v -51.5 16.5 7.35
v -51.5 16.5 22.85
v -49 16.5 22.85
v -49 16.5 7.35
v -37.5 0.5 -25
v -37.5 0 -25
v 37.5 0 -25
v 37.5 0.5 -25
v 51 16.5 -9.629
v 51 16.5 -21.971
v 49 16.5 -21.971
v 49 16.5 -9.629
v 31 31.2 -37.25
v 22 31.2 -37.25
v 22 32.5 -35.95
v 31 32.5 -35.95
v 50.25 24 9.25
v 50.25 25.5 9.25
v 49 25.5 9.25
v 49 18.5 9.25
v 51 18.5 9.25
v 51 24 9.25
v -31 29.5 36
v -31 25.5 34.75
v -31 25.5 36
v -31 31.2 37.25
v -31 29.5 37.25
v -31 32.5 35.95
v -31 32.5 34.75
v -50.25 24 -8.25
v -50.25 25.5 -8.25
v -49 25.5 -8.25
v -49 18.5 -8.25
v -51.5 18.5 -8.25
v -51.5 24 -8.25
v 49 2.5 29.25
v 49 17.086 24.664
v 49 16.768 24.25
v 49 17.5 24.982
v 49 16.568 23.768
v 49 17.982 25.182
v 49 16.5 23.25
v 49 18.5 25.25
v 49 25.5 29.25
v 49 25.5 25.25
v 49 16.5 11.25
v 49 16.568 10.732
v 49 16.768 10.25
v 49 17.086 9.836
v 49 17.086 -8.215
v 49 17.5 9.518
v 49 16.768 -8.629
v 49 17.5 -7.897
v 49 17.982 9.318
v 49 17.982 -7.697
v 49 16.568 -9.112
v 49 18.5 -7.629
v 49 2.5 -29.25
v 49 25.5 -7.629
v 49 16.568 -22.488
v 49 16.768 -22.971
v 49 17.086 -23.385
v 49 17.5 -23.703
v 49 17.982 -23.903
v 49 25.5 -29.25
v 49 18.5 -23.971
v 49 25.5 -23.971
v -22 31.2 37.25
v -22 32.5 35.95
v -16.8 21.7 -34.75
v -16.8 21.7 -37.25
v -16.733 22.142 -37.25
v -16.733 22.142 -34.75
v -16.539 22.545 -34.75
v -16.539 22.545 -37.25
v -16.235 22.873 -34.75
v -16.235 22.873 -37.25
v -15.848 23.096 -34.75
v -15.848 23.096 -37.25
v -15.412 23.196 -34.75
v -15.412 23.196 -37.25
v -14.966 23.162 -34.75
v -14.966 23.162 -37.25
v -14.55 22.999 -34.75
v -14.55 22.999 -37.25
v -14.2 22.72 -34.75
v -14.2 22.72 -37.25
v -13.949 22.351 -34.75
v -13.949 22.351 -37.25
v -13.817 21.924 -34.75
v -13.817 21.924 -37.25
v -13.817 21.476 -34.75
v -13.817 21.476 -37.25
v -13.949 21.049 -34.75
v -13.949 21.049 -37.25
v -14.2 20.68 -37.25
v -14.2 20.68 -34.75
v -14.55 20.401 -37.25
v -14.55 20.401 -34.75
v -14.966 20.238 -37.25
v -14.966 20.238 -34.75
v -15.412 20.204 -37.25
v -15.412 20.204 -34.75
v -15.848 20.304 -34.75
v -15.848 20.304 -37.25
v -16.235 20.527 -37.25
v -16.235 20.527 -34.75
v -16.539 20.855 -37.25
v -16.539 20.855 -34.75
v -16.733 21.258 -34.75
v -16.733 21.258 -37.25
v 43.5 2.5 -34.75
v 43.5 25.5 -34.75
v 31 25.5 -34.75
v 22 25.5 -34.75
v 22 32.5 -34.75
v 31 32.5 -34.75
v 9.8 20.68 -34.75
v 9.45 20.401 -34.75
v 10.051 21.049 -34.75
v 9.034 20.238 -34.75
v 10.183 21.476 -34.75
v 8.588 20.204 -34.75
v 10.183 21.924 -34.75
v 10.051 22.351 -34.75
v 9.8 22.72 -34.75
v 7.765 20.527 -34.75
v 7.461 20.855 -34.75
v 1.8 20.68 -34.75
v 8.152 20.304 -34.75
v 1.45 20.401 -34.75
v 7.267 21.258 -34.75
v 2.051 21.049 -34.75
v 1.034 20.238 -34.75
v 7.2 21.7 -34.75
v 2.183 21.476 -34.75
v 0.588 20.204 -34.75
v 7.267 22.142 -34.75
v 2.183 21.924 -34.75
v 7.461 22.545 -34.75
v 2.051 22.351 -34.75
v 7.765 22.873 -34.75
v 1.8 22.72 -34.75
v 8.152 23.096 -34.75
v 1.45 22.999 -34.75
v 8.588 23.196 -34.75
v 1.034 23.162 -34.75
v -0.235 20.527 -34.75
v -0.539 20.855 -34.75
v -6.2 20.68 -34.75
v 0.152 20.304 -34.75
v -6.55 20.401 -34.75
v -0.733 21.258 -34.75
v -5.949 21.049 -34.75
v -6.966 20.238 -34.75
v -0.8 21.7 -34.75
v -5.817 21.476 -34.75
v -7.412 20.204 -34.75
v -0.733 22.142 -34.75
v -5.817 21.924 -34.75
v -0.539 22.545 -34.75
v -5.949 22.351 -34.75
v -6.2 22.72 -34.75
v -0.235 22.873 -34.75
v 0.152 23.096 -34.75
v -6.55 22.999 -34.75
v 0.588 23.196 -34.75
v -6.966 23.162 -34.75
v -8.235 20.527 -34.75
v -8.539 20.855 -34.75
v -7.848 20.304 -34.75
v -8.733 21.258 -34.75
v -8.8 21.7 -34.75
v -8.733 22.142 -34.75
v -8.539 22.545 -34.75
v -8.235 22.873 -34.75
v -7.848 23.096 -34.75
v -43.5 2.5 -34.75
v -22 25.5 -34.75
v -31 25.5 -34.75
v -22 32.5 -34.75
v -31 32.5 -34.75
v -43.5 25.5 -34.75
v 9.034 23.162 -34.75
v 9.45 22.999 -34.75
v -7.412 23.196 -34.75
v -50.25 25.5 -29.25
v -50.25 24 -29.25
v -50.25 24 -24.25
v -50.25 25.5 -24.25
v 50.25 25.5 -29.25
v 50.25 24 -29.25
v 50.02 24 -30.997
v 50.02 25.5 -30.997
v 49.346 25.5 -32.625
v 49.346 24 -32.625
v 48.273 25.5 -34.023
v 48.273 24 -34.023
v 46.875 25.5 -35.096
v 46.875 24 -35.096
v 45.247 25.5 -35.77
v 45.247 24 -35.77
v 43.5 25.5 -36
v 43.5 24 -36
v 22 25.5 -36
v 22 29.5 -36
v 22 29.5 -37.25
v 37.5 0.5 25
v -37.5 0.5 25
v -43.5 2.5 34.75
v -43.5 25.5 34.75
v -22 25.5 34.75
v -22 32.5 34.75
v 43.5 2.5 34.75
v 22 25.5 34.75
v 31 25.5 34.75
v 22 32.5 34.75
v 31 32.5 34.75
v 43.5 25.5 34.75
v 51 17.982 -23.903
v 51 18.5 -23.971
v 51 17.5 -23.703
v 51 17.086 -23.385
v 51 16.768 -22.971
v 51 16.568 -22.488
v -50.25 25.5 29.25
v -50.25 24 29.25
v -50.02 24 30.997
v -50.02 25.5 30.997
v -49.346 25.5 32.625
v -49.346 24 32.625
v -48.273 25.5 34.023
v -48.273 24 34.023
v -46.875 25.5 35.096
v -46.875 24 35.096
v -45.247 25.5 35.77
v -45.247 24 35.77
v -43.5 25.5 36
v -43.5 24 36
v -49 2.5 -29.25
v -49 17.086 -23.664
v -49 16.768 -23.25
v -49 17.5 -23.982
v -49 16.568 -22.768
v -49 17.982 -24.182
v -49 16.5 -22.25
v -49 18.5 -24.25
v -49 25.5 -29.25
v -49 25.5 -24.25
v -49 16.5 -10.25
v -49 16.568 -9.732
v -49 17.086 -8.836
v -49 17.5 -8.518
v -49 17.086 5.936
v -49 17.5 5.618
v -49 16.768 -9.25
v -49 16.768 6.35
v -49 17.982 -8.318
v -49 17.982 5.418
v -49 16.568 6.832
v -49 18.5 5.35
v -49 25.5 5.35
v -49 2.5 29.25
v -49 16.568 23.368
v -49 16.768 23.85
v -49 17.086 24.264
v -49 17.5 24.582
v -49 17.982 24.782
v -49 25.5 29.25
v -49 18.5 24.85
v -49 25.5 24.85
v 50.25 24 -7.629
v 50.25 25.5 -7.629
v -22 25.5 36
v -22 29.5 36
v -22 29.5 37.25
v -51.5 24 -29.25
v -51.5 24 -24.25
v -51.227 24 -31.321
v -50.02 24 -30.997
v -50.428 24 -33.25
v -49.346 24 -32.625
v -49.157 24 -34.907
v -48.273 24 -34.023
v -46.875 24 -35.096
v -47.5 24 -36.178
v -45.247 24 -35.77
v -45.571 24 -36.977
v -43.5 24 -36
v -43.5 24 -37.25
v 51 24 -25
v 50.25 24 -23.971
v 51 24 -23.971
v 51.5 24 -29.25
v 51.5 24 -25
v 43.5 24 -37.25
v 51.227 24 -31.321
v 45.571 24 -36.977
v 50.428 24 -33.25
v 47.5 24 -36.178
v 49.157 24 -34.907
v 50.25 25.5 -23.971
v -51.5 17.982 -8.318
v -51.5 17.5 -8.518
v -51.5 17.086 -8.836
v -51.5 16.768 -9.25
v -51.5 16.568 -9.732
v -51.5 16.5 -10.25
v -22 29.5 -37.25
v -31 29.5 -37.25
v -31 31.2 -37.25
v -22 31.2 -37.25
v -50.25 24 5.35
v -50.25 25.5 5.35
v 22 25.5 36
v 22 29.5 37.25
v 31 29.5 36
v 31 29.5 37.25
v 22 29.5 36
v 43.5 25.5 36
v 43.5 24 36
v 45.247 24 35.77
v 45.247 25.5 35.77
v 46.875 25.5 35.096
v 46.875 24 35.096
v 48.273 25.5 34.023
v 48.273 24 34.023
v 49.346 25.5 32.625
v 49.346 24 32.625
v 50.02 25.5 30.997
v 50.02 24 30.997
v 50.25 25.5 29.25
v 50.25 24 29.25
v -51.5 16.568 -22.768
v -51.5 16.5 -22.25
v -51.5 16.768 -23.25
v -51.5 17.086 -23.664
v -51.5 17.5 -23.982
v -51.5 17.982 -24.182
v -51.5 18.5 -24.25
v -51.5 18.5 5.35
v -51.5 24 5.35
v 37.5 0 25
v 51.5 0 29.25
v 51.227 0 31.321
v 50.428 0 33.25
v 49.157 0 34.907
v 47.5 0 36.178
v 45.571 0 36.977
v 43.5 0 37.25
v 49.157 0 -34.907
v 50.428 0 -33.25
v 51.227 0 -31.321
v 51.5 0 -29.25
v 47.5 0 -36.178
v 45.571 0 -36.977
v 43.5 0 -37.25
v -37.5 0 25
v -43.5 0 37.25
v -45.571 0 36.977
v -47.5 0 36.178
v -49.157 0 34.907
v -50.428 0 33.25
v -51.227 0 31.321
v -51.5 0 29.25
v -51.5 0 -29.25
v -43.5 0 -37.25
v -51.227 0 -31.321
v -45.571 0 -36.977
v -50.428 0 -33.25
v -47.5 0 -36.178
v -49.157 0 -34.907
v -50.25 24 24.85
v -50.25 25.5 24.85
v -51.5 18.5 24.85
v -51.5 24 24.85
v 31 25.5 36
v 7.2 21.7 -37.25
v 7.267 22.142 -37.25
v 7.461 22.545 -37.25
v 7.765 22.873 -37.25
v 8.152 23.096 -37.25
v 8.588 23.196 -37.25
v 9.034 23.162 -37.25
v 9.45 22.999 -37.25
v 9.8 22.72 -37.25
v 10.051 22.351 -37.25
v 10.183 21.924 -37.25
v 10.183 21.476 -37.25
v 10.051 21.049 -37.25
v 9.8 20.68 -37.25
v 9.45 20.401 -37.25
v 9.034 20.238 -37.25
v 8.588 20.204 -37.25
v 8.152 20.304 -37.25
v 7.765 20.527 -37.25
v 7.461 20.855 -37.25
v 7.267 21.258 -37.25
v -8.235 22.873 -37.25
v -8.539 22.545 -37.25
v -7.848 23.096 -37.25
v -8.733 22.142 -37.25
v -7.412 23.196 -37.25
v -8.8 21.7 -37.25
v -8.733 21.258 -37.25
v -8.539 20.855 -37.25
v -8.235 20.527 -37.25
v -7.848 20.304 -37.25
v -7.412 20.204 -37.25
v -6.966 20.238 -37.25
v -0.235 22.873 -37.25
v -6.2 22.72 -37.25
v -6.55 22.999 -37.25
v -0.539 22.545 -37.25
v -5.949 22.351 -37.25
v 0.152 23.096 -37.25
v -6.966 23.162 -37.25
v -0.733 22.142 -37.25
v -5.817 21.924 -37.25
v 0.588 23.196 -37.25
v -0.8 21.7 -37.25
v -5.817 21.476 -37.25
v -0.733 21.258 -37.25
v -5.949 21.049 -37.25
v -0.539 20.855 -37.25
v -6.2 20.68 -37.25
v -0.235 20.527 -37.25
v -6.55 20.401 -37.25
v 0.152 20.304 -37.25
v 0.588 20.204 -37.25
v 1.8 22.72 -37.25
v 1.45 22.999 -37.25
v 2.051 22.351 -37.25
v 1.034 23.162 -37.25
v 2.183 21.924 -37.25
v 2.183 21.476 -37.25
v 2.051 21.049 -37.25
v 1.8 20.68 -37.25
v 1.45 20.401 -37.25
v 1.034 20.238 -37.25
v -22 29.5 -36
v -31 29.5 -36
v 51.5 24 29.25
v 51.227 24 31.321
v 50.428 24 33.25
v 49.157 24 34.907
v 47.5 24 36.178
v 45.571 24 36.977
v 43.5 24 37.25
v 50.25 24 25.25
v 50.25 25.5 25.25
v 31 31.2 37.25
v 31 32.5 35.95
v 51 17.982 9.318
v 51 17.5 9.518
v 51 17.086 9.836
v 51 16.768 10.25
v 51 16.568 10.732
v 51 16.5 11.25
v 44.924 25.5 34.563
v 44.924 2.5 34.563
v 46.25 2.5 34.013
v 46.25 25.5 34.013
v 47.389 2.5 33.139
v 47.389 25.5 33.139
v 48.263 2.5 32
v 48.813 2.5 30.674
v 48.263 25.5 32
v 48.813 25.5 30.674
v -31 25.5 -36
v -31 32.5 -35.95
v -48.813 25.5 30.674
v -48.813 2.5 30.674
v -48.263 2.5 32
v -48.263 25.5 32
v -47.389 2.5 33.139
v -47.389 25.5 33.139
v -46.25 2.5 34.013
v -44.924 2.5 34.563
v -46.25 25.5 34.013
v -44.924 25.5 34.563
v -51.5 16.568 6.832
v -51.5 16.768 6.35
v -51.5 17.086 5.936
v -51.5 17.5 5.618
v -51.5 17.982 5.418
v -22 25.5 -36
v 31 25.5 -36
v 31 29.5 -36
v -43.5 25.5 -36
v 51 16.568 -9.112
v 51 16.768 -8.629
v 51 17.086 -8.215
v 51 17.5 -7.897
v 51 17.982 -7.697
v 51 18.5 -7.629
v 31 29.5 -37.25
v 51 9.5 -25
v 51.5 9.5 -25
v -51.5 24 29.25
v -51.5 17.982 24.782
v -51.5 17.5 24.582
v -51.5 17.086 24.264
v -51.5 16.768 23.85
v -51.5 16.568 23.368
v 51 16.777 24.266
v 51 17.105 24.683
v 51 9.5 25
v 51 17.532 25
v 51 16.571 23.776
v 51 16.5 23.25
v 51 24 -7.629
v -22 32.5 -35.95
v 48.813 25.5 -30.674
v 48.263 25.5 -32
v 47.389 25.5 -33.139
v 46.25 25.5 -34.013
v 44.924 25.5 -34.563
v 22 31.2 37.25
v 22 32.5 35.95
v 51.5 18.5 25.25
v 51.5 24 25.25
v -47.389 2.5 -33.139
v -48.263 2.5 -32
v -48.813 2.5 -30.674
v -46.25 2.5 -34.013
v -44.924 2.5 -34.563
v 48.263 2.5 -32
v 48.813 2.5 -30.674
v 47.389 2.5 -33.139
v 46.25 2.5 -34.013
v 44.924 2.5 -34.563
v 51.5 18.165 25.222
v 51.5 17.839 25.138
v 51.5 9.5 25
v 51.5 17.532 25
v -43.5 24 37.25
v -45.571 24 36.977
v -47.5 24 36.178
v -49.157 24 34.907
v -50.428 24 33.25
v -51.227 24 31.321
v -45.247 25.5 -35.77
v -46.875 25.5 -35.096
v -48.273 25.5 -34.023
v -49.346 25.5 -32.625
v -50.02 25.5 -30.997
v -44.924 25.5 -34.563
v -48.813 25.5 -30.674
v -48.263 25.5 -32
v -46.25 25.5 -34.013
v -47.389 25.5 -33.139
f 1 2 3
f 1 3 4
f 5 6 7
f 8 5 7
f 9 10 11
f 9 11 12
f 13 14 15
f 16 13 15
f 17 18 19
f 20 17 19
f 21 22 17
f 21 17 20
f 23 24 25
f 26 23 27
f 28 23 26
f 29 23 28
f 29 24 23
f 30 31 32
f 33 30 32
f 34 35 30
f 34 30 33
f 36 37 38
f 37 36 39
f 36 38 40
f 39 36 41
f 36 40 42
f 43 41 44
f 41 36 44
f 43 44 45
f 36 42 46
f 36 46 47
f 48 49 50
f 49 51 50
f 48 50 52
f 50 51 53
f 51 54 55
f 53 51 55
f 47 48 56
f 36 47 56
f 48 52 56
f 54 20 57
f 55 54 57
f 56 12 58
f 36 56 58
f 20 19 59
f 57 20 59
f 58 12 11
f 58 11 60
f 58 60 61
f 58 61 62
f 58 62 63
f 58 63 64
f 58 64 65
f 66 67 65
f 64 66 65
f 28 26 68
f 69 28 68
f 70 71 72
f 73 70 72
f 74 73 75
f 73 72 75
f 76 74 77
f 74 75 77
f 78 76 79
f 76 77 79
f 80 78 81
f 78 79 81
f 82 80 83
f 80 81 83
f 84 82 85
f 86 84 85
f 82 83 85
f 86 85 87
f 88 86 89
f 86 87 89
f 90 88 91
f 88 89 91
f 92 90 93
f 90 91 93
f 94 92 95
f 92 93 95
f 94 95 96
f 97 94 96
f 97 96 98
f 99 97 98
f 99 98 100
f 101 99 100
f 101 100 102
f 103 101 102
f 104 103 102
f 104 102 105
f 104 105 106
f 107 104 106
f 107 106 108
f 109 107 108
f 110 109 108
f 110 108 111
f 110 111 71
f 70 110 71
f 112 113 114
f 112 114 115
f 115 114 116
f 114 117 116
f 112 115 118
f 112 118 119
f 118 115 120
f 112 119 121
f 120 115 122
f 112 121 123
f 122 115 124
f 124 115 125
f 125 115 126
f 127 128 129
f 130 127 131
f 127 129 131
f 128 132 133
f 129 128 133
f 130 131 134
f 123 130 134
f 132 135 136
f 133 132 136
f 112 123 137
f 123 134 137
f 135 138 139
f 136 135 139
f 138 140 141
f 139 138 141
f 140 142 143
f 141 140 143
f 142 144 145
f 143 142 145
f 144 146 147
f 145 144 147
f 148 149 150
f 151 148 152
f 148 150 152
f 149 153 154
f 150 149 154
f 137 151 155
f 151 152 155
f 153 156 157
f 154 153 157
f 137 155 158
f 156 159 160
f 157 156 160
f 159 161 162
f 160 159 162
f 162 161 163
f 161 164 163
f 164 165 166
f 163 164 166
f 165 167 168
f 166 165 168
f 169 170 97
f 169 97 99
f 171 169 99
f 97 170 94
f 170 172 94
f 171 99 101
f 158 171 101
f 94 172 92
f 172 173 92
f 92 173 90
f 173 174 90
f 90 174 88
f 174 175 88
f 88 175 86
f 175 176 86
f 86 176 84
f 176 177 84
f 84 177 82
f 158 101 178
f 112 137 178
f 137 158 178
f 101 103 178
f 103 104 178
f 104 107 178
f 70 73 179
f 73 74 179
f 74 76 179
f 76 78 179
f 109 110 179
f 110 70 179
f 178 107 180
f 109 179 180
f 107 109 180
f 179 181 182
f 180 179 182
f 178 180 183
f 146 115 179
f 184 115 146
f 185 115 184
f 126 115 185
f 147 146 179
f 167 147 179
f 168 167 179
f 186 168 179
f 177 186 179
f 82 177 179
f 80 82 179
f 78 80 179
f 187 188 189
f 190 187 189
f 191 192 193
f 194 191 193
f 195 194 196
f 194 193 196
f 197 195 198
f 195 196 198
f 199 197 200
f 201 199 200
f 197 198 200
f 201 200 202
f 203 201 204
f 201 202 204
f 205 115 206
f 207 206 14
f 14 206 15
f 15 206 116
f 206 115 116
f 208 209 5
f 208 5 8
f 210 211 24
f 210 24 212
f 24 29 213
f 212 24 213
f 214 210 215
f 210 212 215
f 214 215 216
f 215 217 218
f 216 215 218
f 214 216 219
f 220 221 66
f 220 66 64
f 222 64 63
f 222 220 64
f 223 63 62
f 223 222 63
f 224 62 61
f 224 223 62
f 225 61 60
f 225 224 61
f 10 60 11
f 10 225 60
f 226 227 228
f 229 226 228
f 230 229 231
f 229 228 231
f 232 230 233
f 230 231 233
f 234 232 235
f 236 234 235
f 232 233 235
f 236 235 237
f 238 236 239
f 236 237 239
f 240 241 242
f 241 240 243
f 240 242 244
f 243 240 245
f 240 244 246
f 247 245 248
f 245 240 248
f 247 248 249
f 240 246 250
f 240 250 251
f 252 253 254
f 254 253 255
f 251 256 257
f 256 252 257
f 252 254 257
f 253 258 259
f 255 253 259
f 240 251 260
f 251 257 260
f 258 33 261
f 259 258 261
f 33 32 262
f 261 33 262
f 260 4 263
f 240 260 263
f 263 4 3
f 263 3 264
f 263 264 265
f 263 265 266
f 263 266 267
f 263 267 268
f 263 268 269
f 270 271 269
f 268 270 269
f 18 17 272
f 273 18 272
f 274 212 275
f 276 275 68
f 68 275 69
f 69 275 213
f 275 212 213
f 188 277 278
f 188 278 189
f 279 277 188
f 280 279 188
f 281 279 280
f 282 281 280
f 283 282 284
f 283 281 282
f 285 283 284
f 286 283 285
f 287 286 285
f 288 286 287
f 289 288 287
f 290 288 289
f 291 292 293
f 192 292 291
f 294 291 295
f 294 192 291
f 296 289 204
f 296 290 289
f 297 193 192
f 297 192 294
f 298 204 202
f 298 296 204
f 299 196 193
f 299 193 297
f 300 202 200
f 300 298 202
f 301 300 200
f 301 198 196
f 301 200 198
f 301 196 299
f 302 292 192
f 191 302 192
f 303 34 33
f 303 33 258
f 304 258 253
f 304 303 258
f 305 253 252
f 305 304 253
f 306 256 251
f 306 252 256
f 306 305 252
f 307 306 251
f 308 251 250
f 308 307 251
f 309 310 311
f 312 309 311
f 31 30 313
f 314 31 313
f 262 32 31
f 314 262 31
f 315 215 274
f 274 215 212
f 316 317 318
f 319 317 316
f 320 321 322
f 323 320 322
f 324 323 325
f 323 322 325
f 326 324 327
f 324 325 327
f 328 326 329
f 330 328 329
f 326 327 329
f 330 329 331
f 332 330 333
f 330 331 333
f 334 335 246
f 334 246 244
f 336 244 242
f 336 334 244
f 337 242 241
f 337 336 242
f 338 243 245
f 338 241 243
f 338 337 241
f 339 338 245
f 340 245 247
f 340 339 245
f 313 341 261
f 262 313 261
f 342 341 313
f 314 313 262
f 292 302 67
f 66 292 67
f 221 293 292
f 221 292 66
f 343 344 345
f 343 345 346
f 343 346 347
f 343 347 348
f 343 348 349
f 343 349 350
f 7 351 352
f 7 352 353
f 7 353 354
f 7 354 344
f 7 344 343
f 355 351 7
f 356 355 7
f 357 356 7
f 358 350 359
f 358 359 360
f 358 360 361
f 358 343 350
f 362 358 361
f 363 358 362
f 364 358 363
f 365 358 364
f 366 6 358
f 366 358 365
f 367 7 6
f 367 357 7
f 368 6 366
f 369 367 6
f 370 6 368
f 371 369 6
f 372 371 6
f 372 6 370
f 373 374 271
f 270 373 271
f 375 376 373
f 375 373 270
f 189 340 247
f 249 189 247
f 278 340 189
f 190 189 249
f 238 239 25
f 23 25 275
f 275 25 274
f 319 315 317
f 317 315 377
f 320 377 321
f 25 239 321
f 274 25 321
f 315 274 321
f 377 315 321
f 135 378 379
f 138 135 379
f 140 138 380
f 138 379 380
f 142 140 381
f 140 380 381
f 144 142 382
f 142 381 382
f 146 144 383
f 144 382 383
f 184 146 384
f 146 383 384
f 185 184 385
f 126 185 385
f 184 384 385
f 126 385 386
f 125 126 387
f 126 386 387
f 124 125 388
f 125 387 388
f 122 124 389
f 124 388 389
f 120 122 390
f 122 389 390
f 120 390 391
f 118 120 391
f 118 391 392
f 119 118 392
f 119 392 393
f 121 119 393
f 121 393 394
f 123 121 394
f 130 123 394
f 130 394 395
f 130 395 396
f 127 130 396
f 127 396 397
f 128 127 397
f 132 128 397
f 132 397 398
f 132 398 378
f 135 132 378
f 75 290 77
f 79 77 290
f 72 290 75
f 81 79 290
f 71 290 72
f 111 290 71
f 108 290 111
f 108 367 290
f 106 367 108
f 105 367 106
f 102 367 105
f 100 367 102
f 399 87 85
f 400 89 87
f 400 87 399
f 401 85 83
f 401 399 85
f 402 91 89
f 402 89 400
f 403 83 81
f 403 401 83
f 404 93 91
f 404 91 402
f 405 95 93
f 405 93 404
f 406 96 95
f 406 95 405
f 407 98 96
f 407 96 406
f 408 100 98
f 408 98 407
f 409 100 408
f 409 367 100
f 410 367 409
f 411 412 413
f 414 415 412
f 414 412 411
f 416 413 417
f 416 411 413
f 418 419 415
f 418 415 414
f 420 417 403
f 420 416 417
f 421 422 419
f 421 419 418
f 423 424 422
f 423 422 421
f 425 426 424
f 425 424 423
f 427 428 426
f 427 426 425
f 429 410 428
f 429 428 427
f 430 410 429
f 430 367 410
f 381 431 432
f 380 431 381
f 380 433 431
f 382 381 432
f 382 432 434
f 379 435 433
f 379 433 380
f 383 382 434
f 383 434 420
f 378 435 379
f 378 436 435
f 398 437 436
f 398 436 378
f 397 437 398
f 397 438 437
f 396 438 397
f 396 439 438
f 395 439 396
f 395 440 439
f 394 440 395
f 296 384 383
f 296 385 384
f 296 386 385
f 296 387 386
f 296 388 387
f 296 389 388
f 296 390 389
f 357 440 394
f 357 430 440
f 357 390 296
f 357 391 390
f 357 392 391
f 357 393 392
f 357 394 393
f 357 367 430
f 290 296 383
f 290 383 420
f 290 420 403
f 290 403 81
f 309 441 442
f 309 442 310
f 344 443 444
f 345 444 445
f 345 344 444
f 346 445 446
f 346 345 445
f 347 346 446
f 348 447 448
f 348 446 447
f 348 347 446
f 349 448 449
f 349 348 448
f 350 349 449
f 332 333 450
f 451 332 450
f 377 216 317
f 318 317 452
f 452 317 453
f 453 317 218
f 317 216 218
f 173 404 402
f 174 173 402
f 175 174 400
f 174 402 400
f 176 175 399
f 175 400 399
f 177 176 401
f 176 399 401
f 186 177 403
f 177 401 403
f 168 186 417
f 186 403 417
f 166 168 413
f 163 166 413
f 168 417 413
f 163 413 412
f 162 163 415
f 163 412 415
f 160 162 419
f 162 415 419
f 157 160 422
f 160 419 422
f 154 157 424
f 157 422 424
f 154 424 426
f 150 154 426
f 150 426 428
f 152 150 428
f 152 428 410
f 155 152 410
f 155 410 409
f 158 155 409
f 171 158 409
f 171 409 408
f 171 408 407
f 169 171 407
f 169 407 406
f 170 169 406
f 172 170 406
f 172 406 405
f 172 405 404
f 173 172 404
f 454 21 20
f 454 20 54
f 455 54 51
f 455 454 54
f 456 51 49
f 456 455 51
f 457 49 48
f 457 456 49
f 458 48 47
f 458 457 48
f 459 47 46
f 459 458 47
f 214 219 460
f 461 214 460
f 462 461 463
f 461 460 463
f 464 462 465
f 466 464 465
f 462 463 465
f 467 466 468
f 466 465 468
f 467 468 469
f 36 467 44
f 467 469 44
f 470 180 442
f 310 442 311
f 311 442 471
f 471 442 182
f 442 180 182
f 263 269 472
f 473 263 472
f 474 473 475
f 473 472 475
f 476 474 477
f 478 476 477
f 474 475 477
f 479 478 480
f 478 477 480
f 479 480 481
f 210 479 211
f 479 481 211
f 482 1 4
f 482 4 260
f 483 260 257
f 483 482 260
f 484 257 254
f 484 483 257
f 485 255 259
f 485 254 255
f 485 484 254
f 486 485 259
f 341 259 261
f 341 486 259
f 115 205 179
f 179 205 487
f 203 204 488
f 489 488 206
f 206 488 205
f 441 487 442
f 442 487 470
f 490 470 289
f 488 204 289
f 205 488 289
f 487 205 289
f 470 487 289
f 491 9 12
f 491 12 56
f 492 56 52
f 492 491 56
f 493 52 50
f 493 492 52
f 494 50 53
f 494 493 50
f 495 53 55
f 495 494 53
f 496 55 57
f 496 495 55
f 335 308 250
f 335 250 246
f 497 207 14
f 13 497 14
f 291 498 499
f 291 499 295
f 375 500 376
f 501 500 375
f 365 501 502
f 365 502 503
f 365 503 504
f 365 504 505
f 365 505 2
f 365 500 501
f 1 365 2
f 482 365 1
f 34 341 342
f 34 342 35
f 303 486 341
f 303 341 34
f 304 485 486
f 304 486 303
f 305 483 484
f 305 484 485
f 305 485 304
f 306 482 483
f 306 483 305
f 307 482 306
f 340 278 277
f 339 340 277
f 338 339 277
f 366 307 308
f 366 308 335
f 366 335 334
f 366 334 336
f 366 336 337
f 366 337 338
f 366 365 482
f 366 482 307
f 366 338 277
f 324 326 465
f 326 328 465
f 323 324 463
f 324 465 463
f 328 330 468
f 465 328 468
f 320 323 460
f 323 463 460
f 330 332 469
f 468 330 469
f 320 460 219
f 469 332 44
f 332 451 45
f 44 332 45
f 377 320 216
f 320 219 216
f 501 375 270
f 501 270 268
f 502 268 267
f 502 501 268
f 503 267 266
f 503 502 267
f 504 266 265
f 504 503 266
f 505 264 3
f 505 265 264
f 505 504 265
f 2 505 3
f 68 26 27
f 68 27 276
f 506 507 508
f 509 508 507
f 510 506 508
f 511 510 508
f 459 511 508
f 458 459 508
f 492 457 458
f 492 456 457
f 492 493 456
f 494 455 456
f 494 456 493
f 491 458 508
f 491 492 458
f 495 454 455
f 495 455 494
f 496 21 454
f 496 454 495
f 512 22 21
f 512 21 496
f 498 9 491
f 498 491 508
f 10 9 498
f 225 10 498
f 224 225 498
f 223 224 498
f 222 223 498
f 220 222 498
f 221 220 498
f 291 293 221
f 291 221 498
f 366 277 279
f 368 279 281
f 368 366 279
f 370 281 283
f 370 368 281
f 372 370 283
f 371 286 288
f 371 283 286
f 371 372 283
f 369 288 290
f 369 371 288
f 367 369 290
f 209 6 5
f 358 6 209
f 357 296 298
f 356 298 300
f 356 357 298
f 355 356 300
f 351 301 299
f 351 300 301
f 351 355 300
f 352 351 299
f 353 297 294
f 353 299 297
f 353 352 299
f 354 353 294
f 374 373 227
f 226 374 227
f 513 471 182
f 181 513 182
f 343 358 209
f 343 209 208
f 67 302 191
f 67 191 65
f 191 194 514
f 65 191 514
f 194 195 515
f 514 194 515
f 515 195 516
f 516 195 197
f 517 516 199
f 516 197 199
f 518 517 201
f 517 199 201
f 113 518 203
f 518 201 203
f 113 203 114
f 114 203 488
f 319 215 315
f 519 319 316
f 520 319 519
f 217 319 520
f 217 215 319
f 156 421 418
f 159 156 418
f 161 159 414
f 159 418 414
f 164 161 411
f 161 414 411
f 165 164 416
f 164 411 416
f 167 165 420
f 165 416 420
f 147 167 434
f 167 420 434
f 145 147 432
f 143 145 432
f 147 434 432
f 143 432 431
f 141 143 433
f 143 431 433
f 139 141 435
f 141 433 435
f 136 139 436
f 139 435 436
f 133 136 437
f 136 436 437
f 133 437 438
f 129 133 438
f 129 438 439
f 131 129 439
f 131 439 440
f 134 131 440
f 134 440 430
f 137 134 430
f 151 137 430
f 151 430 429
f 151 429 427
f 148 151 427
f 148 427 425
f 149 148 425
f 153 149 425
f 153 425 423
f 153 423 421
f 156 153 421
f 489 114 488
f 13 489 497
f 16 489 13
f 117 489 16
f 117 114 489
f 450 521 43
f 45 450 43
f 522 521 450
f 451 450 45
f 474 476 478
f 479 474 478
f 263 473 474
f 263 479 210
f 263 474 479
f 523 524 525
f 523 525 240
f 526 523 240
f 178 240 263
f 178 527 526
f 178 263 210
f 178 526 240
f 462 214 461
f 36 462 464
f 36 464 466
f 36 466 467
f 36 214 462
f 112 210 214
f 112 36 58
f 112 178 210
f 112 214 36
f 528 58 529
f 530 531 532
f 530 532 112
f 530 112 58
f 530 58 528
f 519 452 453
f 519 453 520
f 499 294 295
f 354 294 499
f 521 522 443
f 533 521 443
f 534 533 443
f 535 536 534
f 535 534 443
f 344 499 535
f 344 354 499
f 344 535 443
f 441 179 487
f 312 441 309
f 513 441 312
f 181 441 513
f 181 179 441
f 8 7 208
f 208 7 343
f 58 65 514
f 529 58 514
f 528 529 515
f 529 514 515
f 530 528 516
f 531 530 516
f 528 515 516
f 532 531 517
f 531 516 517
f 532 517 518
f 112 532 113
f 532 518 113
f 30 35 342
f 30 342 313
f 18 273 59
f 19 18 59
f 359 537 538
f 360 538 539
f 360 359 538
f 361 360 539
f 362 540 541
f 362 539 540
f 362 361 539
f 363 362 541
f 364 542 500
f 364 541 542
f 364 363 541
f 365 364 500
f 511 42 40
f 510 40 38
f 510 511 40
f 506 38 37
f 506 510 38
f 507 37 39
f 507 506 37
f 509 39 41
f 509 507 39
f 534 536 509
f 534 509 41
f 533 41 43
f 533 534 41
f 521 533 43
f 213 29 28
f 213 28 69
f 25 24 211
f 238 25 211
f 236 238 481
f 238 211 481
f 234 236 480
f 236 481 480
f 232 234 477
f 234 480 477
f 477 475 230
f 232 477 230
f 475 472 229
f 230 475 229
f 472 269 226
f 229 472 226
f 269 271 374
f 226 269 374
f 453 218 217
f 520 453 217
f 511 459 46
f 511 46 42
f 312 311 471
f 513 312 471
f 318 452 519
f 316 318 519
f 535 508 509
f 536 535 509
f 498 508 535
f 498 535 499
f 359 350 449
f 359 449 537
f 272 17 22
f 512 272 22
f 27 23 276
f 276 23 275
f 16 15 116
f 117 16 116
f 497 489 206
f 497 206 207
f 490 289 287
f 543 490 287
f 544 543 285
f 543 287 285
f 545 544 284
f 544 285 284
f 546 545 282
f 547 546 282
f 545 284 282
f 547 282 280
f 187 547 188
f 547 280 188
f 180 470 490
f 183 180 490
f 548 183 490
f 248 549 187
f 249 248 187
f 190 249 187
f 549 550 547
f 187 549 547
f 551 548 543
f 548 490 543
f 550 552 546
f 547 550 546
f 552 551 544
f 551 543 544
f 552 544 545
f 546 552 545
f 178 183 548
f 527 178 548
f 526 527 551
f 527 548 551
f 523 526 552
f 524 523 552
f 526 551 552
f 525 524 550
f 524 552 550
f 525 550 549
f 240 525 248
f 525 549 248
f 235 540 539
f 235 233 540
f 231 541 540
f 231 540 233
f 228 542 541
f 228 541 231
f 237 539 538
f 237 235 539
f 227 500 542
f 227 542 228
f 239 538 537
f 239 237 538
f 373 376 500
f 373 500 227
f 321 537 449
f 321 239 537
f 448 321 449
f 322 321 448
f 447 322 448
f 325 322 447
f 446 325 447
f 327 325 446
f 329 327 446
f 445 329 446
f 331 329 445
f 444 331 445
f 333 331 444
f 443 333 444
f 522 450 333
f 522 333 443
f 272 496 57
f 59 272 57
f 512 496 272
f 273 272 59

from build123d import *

# Parameters (mm, degrees)
EXTRUDE_1_DEPTH            = 25.5
CUT_EXTRUDE_1_DEPTH        = 23
CUT_EXTRUDE_START          = -1.5
CUT_EXTRUDE_2_DEPTH        = 1.5
SKETCH_3_W                 = 9
SKETCH_3_H                 = 1.25
EXTRUDE_2_DEPTH            = 7
SKETCH_4_W                 = 9
SKETCH_4_H                 = 3
EXTRUDE_3_DEPTH            = 1.25
CHAMFER_1_SIZE             = 1.3
CHAMFER_1_OF_MIRROR_1_SIZE = 1.3
MIRROR_START               = -31
MIRROR_4_DEPTH             = 9
MIRROR_START_2             = 22
MIRROR_4_2_DEPTH           = 9
SKETCH_5_W                 = 75
SKETCH_5_H                 = 50
CUT_EXTRUDE_3_DEPTH        = 0.5
CUT_EXTRUDE_4_DEPTH        = 115.248905903
CUT_EXTRUDE_4_DEPTH_BACK   = 0.5
SKETCH_6_W                 = 50
SKETCH_6_H                 = 14.5
CUT_EXTRUDE_5_REACH        = 98.222
SKETCH_7_R                 = 1.5
CUT_EXTRUDE_6_REACH        = 116.249
CUT_EXTRUDE_7_REACH        = 116.249


# Read off the part's stored shape, not the designer's step: Зеркальное отражение4
with BuildPart() as part:
    # Эскиз1 → Бобышка-Вытянуть1 (new body)
    with BuildSketch(Plane(origin=(0, 0, 0), x_dir=(1, 0, 0), z_dir=(0, 1, 0))):
        with BuildLine():
            Line((-43.5, 37.25), (43.5, 37.25))
            ThreePointArc((43.5, 37.25), (49.156854249, 34.906854249), (51.5, 29.25))
            Line((51.5, 29.25), (51.5, -29.25))
            ThreePointArc((51.5, -29.25), (49.156854249, -34.906854249), (43.5, -37.25))
            Line((43.5, -37.25), (-43.5, -37.25))
            ThreePointArc((-43.5, -37.25), (-49.156854249, -34.906854249), (-51.5, -29.25))
            Line((-51.5, -29.25), (-51.5, 29.25))
            ThreePointArc((-51.5, 29.25), (-49.156854249, 34.906854249), (-43.5, 37.25))
        make_face()
    extrude(amount=EXTRUDE_1_DEPTH)

    # Эскиз2 → Вырез-Вытянуть1 (cut)
    with BuildSketch(Plane(origin=(0, 25.5, 0), x_dir=(1, 0, 0), z_dir=(0, 1, 0))):
        with BuildLine():
            Line((-49, 29.25), (-49, -29.25))
            ThreePointArc((-49, -29.25), (-47.389087297, -33.139087297), (-43.5, -34.75))
            Line((-43.5, -34.75), (43.5, -34.75))
            ThreePointArc((43.5, -34.75), (47.389087297, -33.139087297), (49, -29.25))
            Line((49, -29.25), (49, 29.25))
            ThreePointArc((49, 29.25), (47.389087297, 33.139087297), (43.5, 34.75))
            Line((43.5, 34.75), (-43.5, 34.75))
            ThreePointArc((-43.5, 34.75), (-47.389087297, 33.139087297), (-49, 29.25))
        make_face()
    extrude(amount=-CUT_EXTRUDE_1_DEPTH, mode=Mode.SUBTRACT)

    # Эскиз2<3> → Вырез-Вытянуть2 (cut)
    with BuildSketch(Plane(origin=(0, 25.5, 0), x_dir=(1, 0, 0), z_dir=(0, 1, 0)).offset(CUT_EXTRUDE_START)):
        with BuildLine():
            Line((51.5, -29.25), (51.5, 29.25))
            ThreePointArc((51.5, 29.25), (49.156854249, 34.906854249), (43.5, 37.25))
            Line((43.5, 37.25), (-43.5, 37.25))
            ThreePointArc((-43.5, 37.25), (-49.156854249, 34.906854249), (-51.5, 29.25))
            Line((-51.5, 29.25), (-51.5, -29.25))
            ThreePointArc((-51.5, -29.25), (-49.156854249, -34.906854249), (-43.5, -37.25))
            Line((-43.5, -37.25), (43.5, -37.25))
            ThreePointArc((43.5, -37.25), (49.156854249, -34.906854249), (51.5, -29.25))
        make_face()
        with BuildLine():
            ThreePointArc((43.5, -36), (48.272970773, -34.022970773), (50.25, -29.25))
            Line((50.25, -29.25), (50.25, 29.25))
            ThreePointArc((50.25, 29.25), (48.272970773, 34.022970773), (43.5, 36))
            Line((43.5, 36), (-43.5, 36))
            ThreePointArc((-43.5, 36), (-48.272970773, 34.022970773), (-50.25, 29.25))
            Line((-50.25, 29.25), (-50.25, -29.25))
            ThreePointArc((-50.25, -29.25), (-48.272970773, -34.022970773), (-43.5, -36))
            Line((-43.5, -36), (43.5, -36))
        make_face(mode=Mode.SUBTRACT)
    extrude(amount=CUT_EXTRUDE_2_DEPTH, mode=Mode.SUBTRACT)

    # Эскиз3 → Бобышка-Вытянуть2 (add)
    with BuildSketch(Plane(origin=(0, 25.5, 0), x_dir=(1, 0, 0), z_dir=(0, 1, 0))):
        with Locations((-26.5, -35.375)):
            Rectangle(SKETCH_3_W, SKETCH_3_H)
    extrude_2 = extrude(amount=EXTRUDE_2_DEPTH)

    # Эскиз4 → Бобышка-Вытянуть3 (add, through all)
    with BuildSketch(Plane.XY.offset(36)):
        with Locations((-26.5, 31)):
            Rectangle(SKETCH_4_W, SKETCH_4_H)
    extrude_3 = extrude(amount=EXTRUDE_3_DEPTH)

    # Фаска1
    chamfer_1_edges = [part.edges().sort_by_distance(p)[0] for p in [
        (-26.5, 32.5, 37.25),
    ]]
    chamfer(chamfer_1_edges, length=CHAMFER_1_SIZE)

    # Зеркальное отражение1: Бобышка-Вытянуть2, Бобышка-Вытянуть3 across plane
    add(extrude_2.mirror(Plane(origin=(0, 0, 0), x_dir=(0, 0, 1), z_dir=(1, 0, 0))))
    add(extrude_3.mirror(Plane(origin=(0, 0, 0), x_dir=(0, 0, 1), z_dir=(1, 0, 0))))

    # Фаска1 of Зеркальное отражение1
    chamfer_1_of_mirror_1_edges = [part.edges().sort_by_distance(p)[0] for p in [
        (26.5, 32.5, 37.25),
    ]]
    chamfer(chamfer_1_of_mirror_1_edges, length=CHAMFER_1_OF_MIRROR_1_SIZE)

    # Зеркальное отражение4 outline → Зеркальное отражение4 (add)
    with BuildSketch(Plane.YZ.offset(MIRROR_START)):
        Polygon((25.5, -34.75), (25.5, -36), (29.5, -36), (29.5, -37.25), (31.2, -37.25), (32.5, -35.95), (32.5, -34.75), align=None)
    extrude(amount=MIRROR_4_DEPTH)

    # Mirror 4 2 outline → Mirror 4 2 (add)
    with BuildSketch(Plane.YZ.offset(MIRROR_START_2)):
        Polygon((25.5, -34.75), (25.5, -36), (29.5, -36), (29.5, -37.25), (31.2, -37.25), (32.5, -35.95), (32.5, -34.75), align=None)
    extrude(amount=MIRROR_4_2_DEPTH)

    # Эскиз5 → Вырез-Вытянуть3 (cut)
    with BuildSketch(Plane.XZ):
        Rectangle(SKETCH_5_W, SKETCH_5_H)
    extrude(amount=-CUT_EXTRUDE_3_DEPTH, mode=Mode.SUBTRACT)

    # Эскиз6 → Вырез-Вытянуть4 (cut, two sides: drawn at the far end of the back side and taken through both)
    with BuildSketch(Plane(origin=(51.5, 0, 0), x_dir=(0, 0, -1), z_dir=(1, 0, 0)).offset(-CUT_EXTRUDE_4_DEPTH_BACK)):
        with Locations((0, 16.75)):
            Rectangle(SKETCH_6_W, SKETCH_6_H)
    extrude(amount=CUT_EXTRUDE_4_DEPTH + CUT_EXTRUDE_4_DEPTH_BACK, mode=Mode.SUBTRACT)

    # Эскиз7 → Вырез-Вытянуть5 (cut, up to next)
    with BuildSketch(Plane(origin=(0, 0, -37.25), x_dir=(-1, 0, 0), z_dir=(0, 0, -1)), mode=Mode.PRIVATE) as cut_extrude_5_sk1:
        with Locations((15.3, 21.7)):
            Circle(SKETCH_7_R)
    cut_extrude_5_tool1 = extrude(cut_extrude_5_sk1.sketch, amount=-CUT_EXTRUDE_5_REACH, mode=Mode.PRIVATE) & part.part
    # Эскиз7 → Вырез-Вытянуть5 (cut, up to next)
    with BuildSketch(Plane(origin=(0, 0, -37.25), x_dir=(-1, 0, 0), z_dir=(0, 0, -1)), mode=Mode.PRIVATE) as cut_extrude_5_sk2:
        with Locations((7.3, 21.7)):
            Circle(SKETCH_7_R)
    cut_extrude_5_tool2 = extrude(cut_extrude_5_sk2.sketch, amount=-CUT_EXTRUDE_5_REACH, mode=Mode.PRIVATE) & part.part
    # Эскиз7 → Вырез-Вытянуть5 (cut, up to next)
    with BuildSketch(Plane(origin=(0, 0, -37.25), x_dir=(-1, 0, 0), z_dir=(0, 0, -1)), mode=Mode.PRIVATE) as cut_extrude_5_sk3:
        with Locations((-0.7, 21.7)):
            Circle(SKETCH_7_R)
    cut_extrude_5_tool3 = extrude(cut_extrude_5_sk3.sketch, amount=-CUT_EXTRUDE_5_REACH, mode=Mode.PRIVATE) & part.part
    # Эскиз7 → Вырез-Вытянуть5 (cut, up to next)
    with BuildSketch(Plane(origin=(0, 0, -37.25), x_dir=(-1, 0, 0), z_dir=(0, 0, -1)), mode=Mode.PRIVATE) as cut_extrude_5_sk4:
        with Locations((-8.7, 21.7)):
            Circle(SKETCH_7_R)
    cut_extrude_5_tool4 = extrude(cut_extrude_5_sk4.sketch, amount=-CUT_EXTRUDE_5_REACH, mode=Mode.PRIVATE) & part.part
    add(cut_extrude_5_tool1.solids().sort_by_distance((-15.3, 21.7, -37.25))[0], mode=Mode.SUBTRACT)
    add(cut_extrude_5_tool2.solids().sort_by_distance((-7.3, 21.7, -37.25))[0], mode=Mode.SUBTRACT)
    add(cut_extrude_5_tool3.solids().sort_by_distance((0.7, 21.7, -37.25))[0], mode=Mode.SUBTRACT)
    add(cut_extrude_5_tool4.solids().sort_by_distance((8.7, 21.7, -37.25))[0], mode=Mode.SUBTRACT)

    # Эскиз8 → Вырез-Вытянуть6 (cut, up to next)
    with BuildSketch(Plane.ZY.offset(51.5), mode=Mode.PRIVATE) as cut_extrude_6_sk1:
        with BuildLine():
            Line((-10.25, 16.5), (-22.25, 16.5))
            ThreePointArc((-22.25, 16.5), (-23.664213562, 17.085786438), (-24.25, 18.5))
            Line((-24.25, 18.5), (-24.25, 25.5))
            Line((-24.25, 25.5), (-8.25, 25.5))
            Line((-8.25, 25.5), (-8.25, 18.5))
            ThreePointArc((-8.25, 18.5), (-8.835786438, 17.085786438), (-10.25, 16.5))
        make_face()
    cut_extrude_6_tool1 = extrude(cut_extrude_6_sk1.sketch, amount=-CUT_EXTRUDE_6_REACH, mode=Mode.PRIVATE) & part.part
    # Эскиз8 → Вырез-Вытянуть6 (cut, up to next)
    with BuildSketch(Plane.ZY.offset(51.5), mode=Mode.PRIVATE) as cut_extrude_6_sk2:
        with BuildLine():
            Line((22.85, 16.5), (7.35, 16.5))
            ThreePointArc((7.35, 16.5), (5.935786438, 17.085786438), (5.35, 18.5))
            Line((5.35, 18.5), (5.35, 25.5))
            Line((5.35, 25.5), (24.85, 25.5))
            Line((24.85, 25.5), (24.85, 18.5))
            ThreePointArc((24.85, 18.5), (24.264213562, 17.085786438), (22.85, 16.5))
        make_face()
    cut_extrude_6_tool2 = extrude(cut_extrude_6_sk2.sketch, amount=-CUT_EXTRUDE_6_REACH, mode=Mode.PRIVATE) & part.part
    add(cut_extrude_6_tool1.solids().sort_by_distance((-51.5, 21.048907, -16.25))[0], mode=Mode.SUBTRACT)
    add(cut_extrude_6_tool2.solids().sort_by_distance((-51.5, 21.040042, 15.1))[0], mode=Mode.SUBTRACT)

    # Эскиз9 → Вырез-Вытянуть7 (cut, up to next)
    with BuildSketch(Plane(origin=(51.5, 0, 0), x_dir=(0, 0, -1), z_dir=(1, 0, 0)), mode=Mode.PRIVATE) as cut_extrude_7_sk1:
        with BuildLine():
            Line((-25.25, 25.5), (-9.25, 25.5))
            Line((-9.25, 25.5), (-9.25, 18.5))
            ThreePointArc((-9.25, 18.5), (-9.835786438, 17.085786438), (-11.25, 16.5))
            Line((-11.25, 16.5), (-23.25, 16.5))
            ThreePointArc((-23.25, 16.5), (-24.664213562, 17.085786438), (-25.25, 18.5))
            Line((-25.25, 18.5), (-25.25, 25.5))
        make_face()
    cut_extrude_7_tool1 = extrude(cut_extrude_7_sk1.sketch, amount=-CUT_EXTRUDE_7_REACH, mode=Mode.PRIVATE) & part.part
    # Эскиз9 → Вырез-Вытянуть7 (cut, up to next)
    with BuildSketch(Plane(origin=(51.5, 0, 0), x_dir=(0, 0, -1), z_dir=(1, 0, 0)), mode=Mode.PRIVATE) as cut_extrude_7_sk2:
        with BuildLine():
            Line((7.629289035, 25.5), (23.970741735, 25.5))
            Line((23.970741735, 25.5), (23.970741735, 18.5))
            ThreePointArc((23.970741735, 18.5), (23.384955297, 17.085786438), (21.970741735, 16.5))
            Line((21.970741735, 16.5), (9.629289035, 16.5))
            ThreePointArc((9.629289035, 16.5), (8.215075473, 17.085786438), (7.629289035, 18.5))
            Line((7.629289035, 18.5), (7.629289035, 25.5))
        make_face()
    cut_extrude_7_tool2 = extrude(cut_extrude_7_sk2.sketch, amount=-CUT_EXTRUDE_7_REACH, mode=Mode.PRIVATE) & part.part
    add(cut_extrude_7_tool1.solids().sort_by_distance((51.5, 21.048907, 17.25))[0], mode=Mode.SUBTRACT)
    add(cut_extrude_7_tool2.solids().sort_by_distance((51.5, 21.047873, -15.800015))[0], mode=Mode.SUBTRACT)


solid = part.part
